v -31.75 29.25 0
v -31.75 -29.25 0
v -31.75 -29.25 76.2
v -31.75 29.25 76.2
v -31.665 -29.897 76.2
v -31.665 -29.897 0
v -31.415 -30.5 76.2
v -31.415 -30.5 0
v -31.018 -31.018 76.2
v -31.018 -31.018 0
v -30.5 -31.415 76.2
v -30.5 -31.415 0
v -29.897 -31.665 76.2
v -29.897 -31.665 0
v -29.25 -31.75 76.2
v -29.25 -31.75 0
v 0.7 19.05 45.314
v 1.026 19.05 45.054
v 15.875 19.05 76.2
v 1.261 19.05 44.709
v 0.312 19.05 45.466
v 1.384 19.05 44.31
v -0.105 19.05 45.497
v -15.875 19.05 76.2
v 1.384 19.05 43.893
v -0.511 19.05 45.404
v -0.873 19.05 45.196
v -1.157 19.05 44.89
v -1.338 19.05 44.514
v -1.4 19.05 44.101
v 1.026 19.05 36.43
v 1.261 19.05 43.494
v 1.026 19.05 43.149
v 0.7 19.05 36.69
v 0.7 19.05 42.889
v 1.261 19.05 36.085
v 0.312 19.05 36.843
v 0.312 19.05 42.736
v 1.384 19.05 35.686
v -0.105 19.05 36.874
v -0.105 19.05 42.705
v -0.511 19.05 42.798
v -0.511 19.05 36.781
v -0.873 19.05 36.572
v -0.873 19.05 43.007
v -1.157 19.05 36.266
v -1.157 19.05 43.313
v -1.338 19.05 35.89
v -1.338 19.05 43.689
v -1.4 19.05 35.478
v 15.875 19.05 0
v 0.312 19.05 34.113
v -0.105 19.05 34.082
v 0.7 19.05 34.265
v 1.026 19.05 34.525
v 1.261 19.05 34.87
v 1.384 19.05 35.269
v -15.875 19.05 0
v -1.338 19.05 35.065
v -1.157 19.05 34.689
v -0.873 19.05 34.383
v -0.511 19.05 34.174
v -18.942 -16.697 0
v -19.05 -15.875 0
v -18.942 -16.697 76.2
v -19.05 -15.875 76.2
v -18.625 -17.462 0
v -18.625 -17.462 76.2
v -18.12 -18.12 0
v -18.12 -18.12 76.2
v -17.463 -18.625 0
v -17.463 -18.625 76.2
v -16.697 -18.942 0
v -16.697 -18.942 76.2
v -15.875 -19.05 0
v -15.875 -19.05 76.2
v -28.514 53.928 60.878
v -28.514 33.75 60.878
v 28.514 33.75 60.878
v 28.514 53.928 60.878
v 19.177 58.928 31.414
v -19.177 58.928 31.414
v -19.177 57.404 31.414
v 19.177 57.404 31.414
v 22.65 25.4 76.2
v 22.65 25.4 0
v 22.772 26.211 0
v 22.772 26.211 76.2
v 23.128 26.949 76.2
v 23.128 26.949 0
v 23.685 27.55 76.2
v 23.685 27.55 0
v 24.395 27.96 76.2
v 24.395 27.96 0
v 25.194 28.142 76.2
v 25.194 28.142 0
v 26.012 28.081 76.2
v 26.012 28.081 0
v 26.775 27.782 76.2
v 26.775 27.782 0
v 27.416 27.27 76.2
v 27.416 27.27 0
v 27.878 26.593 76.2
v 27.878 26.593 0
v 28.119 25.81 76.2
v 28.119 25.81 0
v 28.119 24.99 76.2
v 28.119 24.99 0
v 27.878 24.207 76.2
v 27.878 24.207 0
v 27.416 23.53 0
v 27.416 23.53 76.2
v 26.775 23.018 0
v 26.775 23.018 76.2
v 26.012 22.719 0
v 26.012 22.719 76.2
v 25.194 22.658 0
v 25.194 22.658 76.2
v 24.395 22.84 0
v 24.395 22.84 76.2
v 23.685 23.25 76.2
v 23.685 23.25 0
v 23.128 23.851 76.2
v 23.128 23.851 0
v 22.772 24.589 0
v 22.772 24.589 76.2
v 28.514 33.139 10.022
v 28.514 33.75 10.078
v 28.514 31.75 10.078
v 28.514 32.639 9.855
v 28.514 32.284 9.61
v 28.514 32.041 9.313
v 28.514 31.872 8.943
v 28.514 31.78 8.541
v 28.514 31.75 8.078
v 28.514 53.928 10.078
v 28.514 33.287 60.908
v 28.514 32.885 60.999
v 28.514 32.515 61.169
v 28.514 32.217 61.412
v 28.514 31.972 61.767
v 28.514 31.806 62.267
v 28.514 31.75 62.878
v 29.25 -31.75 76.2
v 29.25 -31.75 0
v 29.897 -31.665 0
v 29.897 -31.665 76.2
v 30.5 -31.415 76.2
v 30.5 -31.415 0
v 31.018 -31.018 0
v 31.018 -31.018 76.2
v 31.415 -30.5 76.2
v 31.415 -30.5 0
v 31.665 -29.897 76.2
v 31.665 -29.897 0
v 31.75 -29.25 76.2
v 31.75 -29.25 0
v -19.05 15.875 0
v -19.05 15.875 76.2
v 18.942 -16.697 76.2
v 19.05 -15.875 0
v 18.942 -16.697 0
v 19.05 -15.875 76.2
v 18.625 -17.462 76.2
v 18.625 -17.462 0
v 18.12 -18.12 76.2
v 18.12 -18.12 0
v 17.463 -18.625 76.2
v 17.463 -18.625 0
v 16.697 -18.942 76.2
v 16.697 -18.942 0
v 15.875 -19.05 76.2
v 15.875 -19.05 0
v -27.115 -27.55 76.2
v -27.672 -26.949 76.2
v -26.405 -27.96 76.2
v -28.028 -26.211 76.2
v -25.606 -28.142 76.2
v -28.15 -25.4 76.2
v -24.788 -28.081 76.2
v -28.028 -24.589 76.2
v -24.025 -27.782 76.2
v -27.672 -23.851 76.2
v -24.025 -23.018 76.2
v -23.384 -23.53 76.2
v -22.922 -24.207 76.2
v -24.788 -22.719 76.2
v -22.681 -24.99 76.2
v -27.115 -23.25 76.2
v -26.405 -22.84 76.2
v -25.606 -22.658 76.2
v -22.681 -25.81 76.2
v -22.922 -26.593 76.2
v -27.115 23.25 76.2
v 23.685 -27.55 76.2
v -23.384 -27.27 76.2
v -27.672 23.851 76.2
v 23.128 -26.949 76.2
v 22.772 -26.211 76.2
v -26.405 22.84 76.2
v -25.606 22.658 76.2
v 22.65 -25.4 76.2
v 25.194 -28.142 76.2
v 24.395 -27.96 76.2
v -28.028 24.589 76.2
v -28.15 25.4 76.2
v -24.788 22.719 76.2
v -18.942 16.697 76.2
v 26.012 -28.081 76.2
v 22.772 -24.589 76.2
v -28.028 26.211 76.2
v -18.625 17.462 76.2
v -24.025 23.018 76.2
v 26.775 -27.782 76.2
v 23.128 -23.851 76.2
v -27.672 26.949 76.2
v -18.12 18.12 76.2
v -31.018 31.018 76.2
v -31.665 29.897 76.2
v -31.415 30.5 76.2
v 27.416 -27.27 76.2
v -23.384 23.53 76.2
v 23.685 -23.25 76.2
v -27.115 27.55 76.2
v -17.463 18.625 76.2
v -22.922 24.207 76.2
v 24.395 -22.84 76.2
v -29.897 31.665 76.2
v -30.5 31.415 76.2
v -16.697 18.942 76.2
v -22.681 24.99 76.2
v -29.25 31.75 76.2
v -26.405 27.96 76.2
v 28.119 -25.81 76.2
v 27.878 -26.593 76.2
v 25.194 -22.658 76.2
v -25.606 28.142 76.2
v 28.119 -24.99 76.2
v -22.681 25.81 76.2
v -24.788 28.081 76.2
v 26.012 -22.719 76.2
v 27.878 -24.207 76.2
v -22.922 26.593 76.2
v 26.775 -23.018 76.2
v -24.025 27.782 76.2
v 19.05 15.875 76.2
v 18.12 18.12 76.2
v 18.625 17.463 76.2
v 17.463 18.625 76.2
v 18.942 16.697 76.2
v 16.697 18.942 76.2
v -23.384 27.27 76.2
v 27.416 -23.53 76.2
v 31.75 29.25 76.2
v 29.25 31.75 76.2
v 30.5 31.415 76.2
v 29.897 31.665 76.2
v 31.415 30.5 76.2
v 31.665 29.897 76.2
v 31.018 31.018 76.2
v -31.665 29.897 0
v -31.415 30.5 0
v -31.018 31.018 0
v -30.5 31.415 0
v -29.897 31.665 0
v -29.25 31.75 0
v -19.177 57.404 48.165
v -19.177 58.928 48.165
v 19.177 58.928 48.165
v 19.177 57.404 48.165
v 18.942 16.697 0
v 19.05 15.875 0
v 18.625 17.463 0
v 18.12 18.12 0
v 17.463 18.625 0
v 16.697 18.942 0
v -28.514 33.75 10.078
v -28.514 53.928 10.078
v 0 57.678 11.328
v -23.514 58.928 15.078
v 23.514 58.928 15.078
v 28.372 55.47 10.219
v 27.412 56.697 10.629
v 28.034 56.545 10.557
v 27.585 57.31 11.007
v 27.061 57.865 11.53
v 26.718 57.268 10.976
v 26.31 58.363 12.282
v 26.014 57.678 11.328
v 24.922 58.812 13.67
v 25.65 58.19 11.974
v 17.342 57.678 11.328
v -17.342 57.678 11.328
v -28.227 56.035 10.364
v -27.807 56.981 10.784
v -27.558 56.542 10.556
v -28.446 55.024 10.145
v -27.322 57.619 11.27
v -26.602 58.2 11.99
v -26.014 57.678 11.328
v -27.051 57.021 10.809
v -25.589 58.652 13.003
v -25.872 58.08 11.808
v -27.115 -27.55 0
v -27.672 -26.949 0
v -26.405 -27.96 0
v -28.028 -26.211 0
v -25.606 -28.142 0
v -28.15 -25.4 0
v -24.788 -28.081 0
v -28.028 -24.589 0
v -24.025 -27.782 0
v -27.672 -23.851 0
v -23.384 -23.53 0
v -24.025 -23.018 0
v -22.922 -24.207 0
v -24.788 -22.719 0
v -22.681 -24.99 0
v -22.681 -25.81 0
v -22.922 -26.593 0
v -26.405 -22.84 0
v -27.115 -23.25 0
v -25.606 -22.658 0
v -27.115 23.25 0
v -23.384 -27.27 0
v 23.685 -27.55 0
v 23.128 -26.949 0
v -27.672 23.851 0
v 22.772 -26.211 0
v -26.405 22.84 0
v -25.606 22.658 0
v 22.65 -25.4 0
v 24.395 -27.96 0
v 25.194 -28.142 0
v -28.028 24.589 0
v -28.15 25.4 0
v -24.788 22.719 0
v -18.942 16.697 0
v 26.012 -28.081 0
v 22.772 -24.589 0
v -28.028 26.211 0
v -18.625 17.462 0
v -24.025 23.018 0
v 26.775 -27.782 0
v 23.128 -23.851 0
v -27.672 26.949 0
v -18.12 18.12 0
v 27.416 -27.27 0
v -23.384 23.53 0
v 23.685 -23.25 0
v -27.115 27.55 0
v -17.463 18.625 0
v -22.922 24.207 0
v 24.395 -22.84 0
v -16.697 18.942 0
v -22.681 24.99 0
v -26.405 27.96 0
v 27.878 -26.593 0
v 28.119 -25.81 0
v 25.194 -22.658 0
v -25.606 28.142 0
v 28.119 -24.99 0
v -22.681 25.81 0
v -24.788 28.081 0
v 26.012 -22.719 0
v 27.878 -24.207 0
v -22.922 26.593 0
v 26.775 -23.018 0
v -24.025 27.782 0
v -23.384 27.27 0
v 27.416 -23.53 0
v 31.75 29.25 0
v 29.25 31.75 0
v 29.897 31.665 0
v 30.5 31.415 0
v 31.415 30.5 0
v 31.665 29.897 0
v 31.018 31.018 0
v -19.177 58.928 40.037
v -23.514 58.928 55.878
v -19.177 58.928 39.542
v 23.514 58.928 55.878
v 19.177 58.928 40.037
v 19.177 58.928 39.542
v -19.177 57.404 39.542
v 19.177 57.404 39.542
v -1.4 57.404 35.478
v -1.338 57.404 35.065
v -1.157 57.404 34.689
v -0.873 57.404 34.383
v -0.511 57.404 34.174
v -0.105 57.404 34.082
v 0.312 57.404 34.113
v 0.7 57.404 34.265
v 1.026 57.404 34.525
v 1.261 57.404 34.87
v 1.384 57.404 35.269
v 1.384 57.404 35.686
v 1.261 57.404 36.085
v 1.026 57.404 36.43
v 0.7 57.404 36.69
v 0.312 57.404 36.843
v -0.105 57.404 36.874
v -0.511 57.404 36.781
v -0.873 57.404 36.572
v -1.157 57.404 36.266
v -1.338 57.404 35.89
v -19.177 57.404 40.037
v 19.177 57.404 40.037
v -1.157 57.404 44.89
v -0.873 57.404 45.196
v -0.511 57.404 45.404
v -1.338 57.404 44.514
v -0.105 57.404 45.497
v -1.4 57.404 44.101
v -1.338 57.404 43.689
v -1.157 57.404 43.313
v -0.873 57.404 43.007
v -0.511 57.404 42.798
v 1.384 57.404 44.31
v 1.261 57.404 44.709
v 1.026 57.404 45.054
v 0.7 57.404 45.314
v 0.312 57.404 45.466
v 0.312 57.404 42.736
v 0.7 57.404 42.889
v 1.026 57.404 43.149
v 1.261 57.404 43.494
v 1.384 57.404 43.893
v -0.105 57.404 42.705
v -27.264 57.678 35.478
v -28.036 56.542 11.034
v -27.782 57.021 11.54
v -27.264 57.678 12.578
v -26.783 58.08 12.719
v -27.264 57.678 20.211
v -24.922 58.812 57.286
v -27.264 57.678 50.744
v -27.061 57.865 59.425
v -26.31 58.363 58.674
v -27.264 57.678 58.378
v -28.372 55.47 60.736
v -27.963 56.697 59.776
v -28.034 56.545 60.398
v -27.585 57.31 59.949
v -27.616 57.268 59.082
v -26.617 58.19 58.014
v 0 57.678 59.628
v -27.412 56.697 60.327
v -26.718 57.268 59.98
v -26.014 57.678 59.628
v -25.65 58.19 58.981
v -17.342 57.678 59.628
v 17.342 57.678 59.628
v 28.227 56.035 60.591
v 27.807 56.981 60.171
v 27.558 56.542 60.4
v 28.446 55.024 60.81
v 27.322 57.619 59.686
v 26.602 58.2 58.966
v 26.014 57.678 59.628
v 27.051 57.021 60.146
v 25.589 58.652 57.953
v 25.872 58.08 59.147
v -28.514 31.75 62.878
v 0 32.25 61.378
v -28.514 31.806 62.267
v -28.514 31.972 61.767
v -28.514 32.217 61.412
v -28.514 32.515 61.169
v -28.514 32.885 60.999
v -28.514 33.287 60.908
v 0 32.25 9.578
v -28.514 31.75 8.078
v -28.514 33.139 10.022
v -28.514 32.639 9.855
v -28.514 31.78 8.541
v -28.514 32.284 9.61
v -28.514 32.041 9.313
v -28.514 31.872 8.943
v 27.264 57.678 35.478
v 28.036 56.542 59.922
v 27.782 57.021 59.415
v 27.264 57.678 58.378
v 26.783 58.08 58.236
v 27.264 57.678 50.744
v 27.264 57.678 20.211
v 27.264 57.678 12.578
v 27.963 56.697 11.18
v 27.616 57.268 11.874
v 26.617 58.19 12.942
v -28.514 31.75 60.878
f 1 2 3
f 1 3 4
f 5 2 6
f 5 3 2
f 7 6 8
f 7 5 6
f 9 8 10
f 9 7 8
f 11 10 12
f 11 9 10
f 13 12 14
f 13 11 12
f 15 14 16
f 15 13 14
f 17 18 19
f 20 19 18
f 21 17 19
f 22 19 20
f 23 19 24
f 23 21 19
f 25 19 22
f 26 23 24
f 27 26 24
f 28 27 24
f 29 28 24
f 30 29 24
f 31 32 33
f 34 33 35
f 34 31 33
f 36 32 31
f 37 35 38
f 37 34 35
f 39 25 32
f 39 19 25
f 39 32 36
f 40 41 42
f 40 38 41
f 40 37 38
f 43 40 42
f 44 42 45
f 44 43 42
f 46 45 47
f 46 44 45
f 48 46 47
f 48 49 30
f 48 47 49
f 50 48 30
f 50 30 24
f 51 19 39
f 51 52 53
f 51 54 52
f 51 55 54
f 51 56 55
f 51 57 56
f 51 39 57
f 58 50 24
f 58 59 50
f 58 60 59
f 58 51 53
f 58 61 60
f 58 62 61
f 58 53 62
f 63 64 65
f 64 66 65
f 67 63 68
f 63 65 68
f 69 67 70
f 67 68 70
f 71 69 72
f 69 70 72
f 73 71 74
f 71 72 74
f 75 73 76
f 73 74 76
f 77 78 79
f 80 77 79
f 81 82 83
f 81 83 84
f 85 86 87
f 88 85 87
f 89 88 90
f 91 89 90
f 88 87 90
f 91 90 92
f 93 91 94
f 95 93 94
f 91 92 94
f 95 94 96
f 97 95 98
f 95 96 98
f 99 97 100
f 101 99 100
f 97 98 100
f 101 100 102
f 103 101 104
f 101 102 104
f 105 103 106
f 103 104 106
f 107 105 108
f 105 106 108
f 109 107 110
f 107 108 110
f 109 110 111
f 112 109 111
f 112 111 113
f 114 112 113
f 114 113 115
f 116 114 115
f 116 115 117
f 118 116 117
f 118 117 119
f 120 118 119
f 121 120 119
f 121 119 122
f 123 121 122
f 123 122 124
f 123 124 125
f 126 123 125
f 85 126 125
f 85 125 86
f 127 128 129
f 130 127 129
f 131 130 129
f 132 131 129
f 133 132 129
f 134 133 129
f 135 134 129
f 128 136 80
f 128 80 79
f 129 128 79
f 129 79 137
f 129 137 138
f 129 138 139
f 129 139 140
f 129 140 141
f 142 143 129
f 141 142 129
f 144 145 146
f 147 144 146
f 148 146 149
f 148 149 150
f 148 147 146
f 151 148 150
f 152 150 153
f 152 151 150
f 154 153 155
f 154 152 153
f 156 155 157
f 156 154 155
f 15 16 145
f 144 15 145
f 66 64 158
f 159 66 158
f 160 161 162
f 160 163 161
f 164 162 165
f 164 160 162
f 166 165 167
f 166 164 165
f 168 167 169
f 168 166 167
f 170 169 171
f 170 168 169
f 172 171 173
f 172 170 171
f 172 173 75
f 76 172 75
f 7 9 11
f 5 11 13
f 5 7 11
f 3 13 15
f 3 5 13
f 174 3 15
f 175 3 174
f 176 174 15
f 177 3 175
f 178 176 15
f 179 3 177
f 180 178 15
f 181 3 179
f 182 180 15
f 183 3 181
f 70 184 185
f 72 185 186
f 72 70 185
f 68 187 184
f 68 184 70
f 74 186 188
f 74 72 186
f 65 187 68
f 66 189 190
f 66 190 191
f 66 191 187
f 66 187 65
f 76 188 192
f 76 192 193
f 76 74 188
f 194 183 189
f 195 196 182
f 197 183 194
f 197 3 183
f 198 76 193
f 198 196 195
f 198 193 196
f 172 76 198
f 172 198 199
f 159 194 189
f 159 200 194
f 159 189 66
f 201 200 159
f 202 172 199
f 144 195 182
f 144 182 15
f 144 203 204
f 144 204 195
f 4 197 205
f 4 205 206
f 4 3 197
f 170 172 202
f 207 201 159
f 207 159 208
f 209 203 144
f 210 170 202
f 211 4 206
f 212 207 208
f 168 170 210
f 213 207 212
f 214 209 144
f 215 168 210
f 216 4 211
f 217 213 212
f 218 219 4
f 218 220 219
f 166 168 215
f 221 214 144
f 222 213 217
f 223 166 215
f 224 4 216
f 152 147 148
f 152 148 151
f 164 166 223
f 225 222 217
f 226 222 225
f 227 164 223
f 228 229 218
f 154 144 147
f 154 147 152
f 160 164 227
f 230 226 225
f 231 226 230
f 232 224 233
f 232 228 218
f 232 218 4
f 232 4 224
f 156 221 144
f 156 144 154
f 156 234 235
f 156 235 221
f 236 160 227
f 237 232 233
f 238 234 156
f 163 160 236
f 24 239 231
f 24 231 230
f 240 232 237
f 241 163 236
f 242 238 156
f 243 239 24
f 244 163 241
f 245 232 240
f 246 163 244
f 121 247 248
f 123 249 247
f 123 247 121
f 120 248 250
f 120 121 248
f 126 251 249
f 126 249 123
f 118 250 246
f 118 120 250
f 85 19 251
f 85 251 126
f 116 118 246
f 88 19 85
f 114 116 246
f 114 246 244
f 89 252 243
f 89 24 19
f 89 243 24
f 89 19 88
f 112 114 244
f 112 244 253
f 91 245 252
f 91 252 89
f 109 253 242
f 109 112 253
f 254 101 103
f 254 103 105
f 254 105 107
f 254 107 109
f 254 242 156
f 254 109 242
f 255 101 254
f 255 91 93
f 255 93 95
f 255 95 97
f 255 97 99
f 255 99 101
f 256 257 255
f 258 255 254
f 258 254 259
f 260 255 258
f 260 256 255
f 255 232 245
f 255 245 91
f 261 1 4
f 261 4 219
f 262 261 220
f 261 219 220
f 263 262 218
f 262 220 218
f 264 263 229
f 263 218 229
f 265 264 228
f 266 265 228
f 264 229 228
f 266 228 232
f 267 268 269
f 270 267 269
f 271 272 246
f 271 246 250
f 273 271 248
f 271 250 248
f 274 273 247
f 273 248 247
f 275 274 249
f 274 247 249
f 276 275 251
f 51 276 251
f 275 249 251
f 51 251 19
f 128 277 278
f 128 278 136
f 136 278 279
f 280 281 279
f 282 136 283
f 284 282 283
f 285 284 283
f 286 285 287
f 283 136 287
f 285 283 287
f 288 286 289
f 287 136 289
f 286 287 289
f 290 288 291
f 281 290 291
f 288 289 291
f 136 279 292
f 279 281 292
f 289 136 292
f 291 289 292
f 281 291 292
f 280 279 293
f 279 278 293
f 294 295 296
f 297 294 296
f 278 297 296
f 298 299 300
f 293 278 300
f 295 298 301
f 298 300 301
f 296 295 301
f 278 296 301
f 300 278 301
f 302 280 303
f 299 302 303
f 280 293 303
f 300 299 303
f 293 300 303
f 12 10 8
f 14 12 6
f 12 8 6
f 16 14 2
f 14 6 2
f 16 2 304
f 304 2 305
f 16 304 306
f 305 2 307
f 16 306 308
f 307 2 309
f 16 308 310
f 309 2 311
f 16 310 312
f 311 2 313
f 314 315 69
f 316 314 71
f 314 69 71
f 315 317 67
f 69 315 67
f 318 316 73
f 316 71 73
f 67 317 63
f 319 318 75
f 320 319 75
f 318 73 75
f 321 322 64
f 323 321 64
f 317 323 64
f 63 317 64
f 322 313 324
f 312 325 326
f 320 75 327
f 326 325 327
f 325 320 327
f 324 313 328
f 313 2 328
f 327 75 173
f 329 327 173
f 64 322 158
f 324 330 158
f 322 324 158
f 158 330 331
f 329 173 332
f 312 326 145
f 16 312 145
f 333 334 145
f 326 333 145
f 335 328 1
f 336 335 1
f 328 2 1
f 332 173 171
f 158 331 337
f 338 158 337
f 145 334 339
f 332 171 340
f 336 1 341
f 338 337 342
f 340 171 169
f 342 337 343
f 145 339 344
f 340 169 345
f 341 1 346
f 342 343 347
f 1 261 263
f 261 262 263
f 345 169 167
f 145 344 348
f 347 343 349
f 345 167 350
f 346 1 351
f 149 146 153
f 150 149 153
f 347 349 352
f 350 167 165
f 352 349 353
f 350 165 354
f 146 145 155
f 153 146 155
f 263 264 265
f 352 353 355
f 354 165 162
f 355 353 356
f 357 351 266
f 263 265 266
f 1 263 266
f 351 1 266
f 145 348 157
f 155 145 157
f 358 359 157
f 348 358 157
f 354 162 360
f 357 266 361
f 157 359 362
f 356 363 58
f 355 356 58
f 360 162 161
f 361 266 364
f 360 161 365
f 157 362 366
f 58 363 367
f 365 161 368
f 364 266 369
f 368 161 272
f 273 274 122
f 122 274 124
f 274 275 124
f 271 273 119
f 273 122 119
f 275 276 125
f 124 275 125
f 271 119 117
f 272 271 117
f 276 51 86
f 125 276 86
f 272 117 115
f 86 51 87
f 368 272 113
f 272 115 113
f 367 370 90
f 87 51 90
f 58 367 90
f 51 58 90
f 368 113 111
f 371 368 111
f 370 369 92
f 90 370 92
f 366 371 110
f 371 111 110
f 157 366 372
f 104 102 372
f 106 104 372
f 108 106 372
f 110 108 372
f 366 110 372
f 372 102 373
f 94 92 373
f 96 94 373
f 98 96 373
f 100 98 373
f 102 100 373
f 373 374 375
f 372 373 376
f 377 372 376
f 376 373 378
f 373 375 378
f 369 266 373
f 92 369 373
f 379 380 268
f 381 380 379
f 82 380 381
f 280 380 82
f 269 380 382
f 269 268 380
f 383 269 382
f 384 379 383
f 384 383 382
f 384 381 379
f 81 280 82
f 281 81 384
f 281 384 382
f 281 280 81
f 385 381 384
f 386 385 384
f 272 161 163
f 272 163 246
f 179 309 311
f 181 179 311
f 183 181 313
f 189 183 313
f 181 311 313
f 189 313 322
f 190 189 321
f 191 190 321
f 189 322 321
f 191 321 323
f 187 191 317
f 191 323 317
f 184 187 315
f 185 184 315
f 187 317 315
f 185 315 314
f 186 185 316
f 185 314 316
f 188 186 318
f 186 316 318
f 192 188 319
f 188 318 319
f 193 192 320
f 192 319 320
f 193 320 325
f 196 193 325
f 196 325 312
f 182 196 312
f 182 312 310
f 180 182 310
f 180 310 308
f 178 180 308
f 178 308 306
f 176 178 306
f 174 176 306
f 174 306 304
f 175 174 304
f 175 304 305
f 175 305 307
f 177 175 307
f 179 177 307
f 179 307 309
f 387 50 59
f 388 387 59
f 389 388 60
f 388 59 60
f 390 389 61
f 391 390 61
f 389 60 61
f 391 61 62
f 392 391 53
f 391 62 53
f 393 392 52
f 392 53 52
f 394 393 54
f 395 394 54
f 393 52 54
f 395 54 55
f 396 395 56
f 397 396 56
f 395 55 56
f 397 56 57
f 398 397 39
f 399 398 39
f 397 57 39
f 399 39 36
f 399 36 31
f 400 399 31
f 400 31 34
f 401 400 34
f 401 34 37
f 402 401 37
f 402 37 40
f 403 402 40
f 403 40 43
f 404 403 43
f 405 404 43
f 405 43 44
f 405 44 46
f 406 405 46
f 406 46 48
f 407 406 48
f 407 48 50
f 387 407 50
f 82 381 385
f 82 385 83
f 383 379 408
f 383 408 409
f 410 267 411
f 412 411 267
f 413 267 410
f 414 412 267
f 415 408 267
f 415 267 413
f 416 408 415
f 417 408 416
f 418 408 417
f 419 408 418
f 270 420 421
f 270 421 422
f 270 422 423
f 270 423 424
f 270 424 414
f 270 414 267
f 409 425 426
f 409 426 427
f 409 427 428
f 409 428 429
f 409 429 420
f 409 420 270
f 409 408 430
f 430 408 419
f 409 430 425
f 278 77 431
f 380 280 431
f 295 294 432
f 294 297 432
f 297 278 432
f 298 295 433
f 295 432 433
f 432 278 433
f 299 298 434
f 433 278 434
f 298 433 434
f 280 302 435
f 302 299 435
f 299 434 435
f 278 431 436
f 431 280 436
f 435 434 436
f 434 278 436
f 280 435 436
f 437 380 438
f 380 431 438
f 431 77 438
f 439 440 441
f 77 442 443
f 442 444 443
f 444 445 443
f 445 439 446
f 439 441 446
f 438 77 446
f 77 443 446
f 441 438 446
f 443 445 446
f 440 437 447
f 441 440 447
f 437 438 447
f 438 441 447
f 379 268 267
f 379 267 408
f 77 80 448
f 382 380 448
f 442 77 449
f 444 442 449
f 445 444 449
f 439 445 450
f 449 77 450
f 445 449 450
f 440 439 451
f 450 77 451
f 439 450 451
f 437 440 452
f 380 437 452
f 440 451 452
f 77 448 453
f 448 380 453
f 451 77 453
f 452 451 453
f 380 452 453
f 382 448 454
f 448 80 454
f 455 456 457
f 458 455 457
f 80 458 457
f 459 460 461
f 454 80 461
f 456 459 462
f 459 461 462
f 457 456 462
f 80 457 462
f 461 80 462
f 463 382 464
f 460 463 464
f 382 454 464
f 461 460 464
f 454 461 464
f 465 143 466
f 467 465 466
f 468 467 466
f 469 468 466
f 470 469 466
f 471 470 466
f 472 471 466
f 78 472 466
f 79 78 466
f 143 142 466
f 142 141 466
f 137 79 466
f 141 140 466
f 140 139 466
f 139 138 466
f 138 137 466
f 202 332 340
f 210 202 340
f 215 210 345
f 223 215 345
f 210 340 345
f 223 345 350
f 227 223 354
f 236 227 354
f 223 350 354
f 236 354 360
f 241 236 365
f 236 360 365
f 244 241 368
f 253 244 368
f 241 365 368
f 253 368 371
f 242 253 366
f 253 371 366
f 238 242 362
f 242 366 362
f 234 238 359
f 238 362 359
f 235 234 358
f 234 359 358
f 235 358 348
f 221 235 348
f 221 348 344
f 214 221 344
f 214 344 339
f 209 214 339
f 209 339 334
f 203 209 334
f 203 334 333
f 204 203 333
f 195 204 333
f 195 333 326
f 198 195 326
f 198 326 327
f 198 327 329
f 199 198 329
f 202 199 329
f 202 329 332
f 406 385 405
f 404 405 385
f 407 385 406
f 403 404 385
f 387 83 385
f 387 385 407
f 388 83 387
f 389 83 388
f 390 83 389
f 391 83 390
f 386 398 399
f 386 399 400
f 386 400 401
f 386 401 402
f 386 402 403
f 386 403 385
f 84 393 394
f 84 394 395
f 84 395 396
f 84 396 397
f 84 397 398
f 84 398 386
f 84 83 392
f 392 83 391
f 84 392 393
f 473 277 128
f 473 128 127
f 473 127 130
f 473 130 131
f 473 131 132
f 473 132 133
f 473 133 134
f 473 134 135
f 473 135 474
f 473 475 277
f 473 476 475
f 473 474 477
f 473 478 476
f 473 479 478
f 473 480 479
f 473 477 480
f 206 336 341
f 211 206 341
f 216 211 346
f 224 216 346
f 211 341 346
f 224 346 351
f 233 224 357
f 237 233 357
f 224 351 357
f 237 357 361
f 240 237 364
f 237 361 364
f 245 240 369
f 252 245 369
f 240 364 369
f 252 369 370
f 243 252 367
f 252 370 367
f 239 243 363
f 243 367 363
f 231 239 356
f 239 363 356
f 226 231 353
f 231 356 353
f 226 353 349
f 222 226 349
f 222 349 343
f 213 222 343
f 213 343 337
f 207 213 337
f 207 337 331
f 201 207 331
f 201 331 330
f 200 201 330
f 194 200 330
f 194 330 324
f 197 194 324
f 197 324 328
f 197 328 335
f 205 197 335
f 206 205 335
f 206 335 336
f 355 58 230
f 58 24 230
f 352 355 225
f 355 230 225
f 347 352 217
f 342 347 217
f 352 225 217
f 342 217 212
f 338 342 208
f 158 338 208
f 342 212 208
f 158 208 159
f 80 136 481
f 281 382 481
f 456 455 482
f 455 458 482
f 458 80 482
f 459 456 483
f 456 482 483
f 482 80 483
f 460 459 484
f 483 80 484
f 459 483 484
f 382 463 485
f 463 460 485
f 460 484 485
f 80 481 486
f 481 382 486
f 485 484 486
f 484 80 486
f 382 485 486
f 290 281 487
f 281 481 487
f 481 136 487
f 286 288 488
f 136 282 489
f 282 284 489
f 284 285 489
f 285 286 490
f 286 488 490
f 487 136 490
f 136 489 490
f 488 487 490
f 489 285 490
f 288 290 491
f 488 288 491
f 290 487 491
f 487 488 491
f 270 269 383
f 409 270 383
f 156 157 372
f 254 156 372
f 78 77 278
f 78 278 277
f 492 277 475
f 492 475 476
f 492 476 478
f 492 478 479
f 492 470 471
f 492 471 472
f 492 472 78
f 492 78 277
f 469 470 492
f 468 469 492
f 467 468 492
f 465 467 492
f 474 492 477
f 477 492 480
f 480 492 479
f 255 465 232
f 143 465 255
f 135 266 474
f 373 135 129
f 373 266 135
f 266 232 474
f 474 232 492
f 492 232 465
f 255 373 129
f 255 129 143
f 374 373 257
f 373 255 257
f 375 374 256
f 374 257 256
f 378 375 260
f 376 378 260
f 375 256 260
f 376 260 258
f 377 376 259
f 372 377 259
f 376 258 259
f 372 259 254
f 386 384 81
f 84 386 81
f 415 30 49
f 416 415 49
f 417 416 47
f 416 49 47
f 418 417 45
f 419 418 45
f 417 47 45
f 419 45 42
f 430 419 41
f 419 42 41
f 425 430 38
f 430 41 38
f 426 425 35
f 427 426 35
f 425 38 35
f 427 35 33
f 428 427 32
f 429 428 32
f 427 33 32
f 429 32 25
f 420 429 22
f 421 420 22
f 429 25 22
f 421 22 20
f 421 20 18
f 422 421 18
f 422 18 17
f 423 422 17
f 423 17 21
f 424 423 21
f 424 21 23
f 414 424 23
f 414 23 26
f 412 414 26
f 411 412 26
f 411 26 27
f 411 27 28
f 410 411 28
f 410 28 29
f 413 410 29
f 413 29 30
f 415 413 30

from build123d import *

# Parameters (mm, degrees)
SKETCH1_W                = 63.5
SKETCH1_H                = 63.5
BOSS_EXTRUDE1_DEPTH      = 76.2
M5_CLEARANCE_HOLE1_D     = 5.5
SKETCH4_W                = 38.1
SKETCH4_H                = 38.1
CUT_EXTRUDE1_DEPTH       = 89.44526556
FILLET1_R                = 2.5
FILLET2_R                = 3.175
SKETCH5_W                = 57.027431562
SKETCH5_H                = 50.8
BOSS_EXTRUDE2_DEPTH      = 27.178
SKETCH7_W                = 38.354
SKETCH7_H                = 8.128
CUT_EXTRUDE2_DEPTH       = 1.524
M3_CLEARANCE_HOLE1_D     = 2.8
M3_CLEARANCE_HOLE1_DEPTH = 38.354
FILLET3_SIZE             = 5
FILLET4_SIZE             = 2
FILLET5_SIZE             = 2


with BuildPart() as part:
    # Sketch1 → Boss-Extrude1 (new body)
    with BuildSketch(Plane.XY):
        Rectangle(SKETCH1_W, SKETCH1_H)
    extrude(amount=BOSS_EXTRUDE1_DEPTH)

    # M5 Clearance Hole1 (through all)
    with Locations(Plane.XY.offset(76.2)):
        with Locations((25.4, -25.4), (25.4, 25.4), (-25.4, -25.4), (-25.4, 25.4)):
            Hole(M5_CLEARANCE_HOLE1_D / 2)

    # Sketch4 → Cut-Extrude1 (cut, through all)
    with BuildSketch(Plane(origin=(0, 0, 0), x_dir=(-1, 0, 0), z_dir=(0, 0, -1))):
        Rectangle(SKETCH4_W, SKETCH4_H)
    extrude(amount=-CUT_EXTRUDE1_DEPTH, mode=Mode.SUBTRACT)

    # Fillet1
    fillet1_edges = [part.edges().sort_by_distance(p)[0] for p in [
        (31.75, -31.75, 38.1),
        (-31.75, -31.75, 38.1),
        (-31.75, 31.75, 38.1),
        (31.75, 31.75, 38.1),
    ]]
    fillet(fillet1_edges, radius=FILLET1_R)

    # Fillet2
    fillet2_edges = [part.edges().sort_by_distance(p)[0] for p in [
        (19.05, -19.05, 38.1),
        (19.05, 19.05, 38.1),
        (-19.05, 19.05, 38.1),
        (-19.05, -19.05, 38.1),
    ]]
    fillet(fillet2_edges, radius=FILLET2_R)

    # Sketch5 → Boss-Extrude2 (add)
    with BuildSketch(Plane(origin=(0, 31.75, 0), x_dir=(1, 0, 0), z_dir=(0, 1, 0))):
        with Locations((0, -35.47764662)):
            Rectangle(SKETCH5_W, SKETCH5_H)
    extrude(amount=BOSS_EXTRUDE2_DEPTH)

    # Sketch7 → Cut-Extrude2 (cut)
    with BuildSketch(Plane(origin=(0, 58.928, 0), x_dir=(1, 0, 0), z_dir=(0, 1, 0))):
        with Locations((-274.796433557, 103.138535486)):
            Rectangle(SKETCH7_W, SKETCH7_H)
        with Locations((0, -35.47764662)):
            Rectangle(SKETCH7_W, SKETCH7_H)
        with Locations((0, -44.101274776)):
            Rectangle(SKETCH7_W, SKETCH7_H)
    extrude(amount=-CUT_EXTRUDE2_DEPTH, mode=Mode.SUBTRACT)

    # M3 Clearance Hole1
    with Locations(Plane(origin=(0, 57.404, 0), x_dir=(1, 0, 0), z_dir=(0, 1, 0))):
        with Locations((0, -44.101274776), (0, -35.47764662)):
            Hole(M3_CLEARANCE_HOLE1_D / 2, depth=M3_CLEARANCE_HOLE1_DEPTH)

    # Fillet3
    # a fillet whose section is not a circle: 5 mm, written as the material it takes off along each edge
    with BuildSketch(Plane(origin=(-41.013715781, 58.928, 10.07764662), x_dir=(0, -1, 0), z_dir=(1, 0, 0)), Plane(origin=(41.013715781, 58.928, 60.87764662), x_dir=(0, -1, 0), z_dir=(-1, 0, 0))) as fillet3_piece_1:
        with BuildLine():
            Bezier((FILLET3_SIZE, 0), (0, 0), (0, -FILLET3_SIZE), weights=[1, 1, 1])
            Line((0, -FILLET3_SIZE), (0, 0))
            Line((0, 0), (FILLET3_SIZE, 0))
        make_face()
    extrude(amount=82.027431561, mode=Mode.SUBTRACT)
    with BuildSketch(Plane(origin=(28.513715781, 58.928, -2.42235338), x_dir=(0, -1, 0), z_dir=(0, 0, 1)), Plane(origin=(-28.513715781, 58.928, 73.37764662), x_dir=(0, -1, 0), z_dir=(0, 0, -1))) as fillet3_piece_2:
        with BuildLine():
            Bezier((FILLET3_SIZE, 0), (0, 0), (0, -FILLET3_SIZE), weights=[1, 1, 1])
            Line((0, -FILLET3_SIZE), (0, 0))
            Line((0, 0), (FILLET3_SIZE, 0))
        make_face()
    extrude(amount=75.8, mode=Mode.SUBTRACT)

    # Fillet4
    # a fillet whose section is not a circle: 2 mm, written as the material it adds along each edge
    with BuildSketch(Plane(origin=(28.513715781, 31.75, 60.87764662), x_dir=(0, 0, 1), z_dir=(-1, 0, 0))) as fillet4_piece_1:
        with BuildLine():
            Bezier((FILLET4_SIZE, 0), (0, 0), (0, FILLET4_SIZE), weights=[1, 1, 1])
            Line((0, FILLET4_SIZE), (0, 0))
            Line((0, 0), (FILLET4_SIZE, 0))
        make_face()
    extrude(amount=57.027431561)

    # Fillet5
    # a fillet whose section is not a circle: 2 mm, written as the material it adds along each edge
    with BuildSketch(Plane(origin=(-28.513715781, 31.75, 10.07764662), x_dir=(0, 1, 0), z_dir=(1, 0, 0))) as fillet5_piece_1:
        with BuildLine():
            Bezier((FILLET5_SIZE, 0), (0, 0), (0, -FILLET5_SIZE), weights=[1, 1, 1])
            Line((0, -FILLET5_SIZE), (0, 0))
            Line((0, 0), (FILLET5_SIZE, 0))
        make_face()
    extrude(amount=57.027431561)


solid = part.part
